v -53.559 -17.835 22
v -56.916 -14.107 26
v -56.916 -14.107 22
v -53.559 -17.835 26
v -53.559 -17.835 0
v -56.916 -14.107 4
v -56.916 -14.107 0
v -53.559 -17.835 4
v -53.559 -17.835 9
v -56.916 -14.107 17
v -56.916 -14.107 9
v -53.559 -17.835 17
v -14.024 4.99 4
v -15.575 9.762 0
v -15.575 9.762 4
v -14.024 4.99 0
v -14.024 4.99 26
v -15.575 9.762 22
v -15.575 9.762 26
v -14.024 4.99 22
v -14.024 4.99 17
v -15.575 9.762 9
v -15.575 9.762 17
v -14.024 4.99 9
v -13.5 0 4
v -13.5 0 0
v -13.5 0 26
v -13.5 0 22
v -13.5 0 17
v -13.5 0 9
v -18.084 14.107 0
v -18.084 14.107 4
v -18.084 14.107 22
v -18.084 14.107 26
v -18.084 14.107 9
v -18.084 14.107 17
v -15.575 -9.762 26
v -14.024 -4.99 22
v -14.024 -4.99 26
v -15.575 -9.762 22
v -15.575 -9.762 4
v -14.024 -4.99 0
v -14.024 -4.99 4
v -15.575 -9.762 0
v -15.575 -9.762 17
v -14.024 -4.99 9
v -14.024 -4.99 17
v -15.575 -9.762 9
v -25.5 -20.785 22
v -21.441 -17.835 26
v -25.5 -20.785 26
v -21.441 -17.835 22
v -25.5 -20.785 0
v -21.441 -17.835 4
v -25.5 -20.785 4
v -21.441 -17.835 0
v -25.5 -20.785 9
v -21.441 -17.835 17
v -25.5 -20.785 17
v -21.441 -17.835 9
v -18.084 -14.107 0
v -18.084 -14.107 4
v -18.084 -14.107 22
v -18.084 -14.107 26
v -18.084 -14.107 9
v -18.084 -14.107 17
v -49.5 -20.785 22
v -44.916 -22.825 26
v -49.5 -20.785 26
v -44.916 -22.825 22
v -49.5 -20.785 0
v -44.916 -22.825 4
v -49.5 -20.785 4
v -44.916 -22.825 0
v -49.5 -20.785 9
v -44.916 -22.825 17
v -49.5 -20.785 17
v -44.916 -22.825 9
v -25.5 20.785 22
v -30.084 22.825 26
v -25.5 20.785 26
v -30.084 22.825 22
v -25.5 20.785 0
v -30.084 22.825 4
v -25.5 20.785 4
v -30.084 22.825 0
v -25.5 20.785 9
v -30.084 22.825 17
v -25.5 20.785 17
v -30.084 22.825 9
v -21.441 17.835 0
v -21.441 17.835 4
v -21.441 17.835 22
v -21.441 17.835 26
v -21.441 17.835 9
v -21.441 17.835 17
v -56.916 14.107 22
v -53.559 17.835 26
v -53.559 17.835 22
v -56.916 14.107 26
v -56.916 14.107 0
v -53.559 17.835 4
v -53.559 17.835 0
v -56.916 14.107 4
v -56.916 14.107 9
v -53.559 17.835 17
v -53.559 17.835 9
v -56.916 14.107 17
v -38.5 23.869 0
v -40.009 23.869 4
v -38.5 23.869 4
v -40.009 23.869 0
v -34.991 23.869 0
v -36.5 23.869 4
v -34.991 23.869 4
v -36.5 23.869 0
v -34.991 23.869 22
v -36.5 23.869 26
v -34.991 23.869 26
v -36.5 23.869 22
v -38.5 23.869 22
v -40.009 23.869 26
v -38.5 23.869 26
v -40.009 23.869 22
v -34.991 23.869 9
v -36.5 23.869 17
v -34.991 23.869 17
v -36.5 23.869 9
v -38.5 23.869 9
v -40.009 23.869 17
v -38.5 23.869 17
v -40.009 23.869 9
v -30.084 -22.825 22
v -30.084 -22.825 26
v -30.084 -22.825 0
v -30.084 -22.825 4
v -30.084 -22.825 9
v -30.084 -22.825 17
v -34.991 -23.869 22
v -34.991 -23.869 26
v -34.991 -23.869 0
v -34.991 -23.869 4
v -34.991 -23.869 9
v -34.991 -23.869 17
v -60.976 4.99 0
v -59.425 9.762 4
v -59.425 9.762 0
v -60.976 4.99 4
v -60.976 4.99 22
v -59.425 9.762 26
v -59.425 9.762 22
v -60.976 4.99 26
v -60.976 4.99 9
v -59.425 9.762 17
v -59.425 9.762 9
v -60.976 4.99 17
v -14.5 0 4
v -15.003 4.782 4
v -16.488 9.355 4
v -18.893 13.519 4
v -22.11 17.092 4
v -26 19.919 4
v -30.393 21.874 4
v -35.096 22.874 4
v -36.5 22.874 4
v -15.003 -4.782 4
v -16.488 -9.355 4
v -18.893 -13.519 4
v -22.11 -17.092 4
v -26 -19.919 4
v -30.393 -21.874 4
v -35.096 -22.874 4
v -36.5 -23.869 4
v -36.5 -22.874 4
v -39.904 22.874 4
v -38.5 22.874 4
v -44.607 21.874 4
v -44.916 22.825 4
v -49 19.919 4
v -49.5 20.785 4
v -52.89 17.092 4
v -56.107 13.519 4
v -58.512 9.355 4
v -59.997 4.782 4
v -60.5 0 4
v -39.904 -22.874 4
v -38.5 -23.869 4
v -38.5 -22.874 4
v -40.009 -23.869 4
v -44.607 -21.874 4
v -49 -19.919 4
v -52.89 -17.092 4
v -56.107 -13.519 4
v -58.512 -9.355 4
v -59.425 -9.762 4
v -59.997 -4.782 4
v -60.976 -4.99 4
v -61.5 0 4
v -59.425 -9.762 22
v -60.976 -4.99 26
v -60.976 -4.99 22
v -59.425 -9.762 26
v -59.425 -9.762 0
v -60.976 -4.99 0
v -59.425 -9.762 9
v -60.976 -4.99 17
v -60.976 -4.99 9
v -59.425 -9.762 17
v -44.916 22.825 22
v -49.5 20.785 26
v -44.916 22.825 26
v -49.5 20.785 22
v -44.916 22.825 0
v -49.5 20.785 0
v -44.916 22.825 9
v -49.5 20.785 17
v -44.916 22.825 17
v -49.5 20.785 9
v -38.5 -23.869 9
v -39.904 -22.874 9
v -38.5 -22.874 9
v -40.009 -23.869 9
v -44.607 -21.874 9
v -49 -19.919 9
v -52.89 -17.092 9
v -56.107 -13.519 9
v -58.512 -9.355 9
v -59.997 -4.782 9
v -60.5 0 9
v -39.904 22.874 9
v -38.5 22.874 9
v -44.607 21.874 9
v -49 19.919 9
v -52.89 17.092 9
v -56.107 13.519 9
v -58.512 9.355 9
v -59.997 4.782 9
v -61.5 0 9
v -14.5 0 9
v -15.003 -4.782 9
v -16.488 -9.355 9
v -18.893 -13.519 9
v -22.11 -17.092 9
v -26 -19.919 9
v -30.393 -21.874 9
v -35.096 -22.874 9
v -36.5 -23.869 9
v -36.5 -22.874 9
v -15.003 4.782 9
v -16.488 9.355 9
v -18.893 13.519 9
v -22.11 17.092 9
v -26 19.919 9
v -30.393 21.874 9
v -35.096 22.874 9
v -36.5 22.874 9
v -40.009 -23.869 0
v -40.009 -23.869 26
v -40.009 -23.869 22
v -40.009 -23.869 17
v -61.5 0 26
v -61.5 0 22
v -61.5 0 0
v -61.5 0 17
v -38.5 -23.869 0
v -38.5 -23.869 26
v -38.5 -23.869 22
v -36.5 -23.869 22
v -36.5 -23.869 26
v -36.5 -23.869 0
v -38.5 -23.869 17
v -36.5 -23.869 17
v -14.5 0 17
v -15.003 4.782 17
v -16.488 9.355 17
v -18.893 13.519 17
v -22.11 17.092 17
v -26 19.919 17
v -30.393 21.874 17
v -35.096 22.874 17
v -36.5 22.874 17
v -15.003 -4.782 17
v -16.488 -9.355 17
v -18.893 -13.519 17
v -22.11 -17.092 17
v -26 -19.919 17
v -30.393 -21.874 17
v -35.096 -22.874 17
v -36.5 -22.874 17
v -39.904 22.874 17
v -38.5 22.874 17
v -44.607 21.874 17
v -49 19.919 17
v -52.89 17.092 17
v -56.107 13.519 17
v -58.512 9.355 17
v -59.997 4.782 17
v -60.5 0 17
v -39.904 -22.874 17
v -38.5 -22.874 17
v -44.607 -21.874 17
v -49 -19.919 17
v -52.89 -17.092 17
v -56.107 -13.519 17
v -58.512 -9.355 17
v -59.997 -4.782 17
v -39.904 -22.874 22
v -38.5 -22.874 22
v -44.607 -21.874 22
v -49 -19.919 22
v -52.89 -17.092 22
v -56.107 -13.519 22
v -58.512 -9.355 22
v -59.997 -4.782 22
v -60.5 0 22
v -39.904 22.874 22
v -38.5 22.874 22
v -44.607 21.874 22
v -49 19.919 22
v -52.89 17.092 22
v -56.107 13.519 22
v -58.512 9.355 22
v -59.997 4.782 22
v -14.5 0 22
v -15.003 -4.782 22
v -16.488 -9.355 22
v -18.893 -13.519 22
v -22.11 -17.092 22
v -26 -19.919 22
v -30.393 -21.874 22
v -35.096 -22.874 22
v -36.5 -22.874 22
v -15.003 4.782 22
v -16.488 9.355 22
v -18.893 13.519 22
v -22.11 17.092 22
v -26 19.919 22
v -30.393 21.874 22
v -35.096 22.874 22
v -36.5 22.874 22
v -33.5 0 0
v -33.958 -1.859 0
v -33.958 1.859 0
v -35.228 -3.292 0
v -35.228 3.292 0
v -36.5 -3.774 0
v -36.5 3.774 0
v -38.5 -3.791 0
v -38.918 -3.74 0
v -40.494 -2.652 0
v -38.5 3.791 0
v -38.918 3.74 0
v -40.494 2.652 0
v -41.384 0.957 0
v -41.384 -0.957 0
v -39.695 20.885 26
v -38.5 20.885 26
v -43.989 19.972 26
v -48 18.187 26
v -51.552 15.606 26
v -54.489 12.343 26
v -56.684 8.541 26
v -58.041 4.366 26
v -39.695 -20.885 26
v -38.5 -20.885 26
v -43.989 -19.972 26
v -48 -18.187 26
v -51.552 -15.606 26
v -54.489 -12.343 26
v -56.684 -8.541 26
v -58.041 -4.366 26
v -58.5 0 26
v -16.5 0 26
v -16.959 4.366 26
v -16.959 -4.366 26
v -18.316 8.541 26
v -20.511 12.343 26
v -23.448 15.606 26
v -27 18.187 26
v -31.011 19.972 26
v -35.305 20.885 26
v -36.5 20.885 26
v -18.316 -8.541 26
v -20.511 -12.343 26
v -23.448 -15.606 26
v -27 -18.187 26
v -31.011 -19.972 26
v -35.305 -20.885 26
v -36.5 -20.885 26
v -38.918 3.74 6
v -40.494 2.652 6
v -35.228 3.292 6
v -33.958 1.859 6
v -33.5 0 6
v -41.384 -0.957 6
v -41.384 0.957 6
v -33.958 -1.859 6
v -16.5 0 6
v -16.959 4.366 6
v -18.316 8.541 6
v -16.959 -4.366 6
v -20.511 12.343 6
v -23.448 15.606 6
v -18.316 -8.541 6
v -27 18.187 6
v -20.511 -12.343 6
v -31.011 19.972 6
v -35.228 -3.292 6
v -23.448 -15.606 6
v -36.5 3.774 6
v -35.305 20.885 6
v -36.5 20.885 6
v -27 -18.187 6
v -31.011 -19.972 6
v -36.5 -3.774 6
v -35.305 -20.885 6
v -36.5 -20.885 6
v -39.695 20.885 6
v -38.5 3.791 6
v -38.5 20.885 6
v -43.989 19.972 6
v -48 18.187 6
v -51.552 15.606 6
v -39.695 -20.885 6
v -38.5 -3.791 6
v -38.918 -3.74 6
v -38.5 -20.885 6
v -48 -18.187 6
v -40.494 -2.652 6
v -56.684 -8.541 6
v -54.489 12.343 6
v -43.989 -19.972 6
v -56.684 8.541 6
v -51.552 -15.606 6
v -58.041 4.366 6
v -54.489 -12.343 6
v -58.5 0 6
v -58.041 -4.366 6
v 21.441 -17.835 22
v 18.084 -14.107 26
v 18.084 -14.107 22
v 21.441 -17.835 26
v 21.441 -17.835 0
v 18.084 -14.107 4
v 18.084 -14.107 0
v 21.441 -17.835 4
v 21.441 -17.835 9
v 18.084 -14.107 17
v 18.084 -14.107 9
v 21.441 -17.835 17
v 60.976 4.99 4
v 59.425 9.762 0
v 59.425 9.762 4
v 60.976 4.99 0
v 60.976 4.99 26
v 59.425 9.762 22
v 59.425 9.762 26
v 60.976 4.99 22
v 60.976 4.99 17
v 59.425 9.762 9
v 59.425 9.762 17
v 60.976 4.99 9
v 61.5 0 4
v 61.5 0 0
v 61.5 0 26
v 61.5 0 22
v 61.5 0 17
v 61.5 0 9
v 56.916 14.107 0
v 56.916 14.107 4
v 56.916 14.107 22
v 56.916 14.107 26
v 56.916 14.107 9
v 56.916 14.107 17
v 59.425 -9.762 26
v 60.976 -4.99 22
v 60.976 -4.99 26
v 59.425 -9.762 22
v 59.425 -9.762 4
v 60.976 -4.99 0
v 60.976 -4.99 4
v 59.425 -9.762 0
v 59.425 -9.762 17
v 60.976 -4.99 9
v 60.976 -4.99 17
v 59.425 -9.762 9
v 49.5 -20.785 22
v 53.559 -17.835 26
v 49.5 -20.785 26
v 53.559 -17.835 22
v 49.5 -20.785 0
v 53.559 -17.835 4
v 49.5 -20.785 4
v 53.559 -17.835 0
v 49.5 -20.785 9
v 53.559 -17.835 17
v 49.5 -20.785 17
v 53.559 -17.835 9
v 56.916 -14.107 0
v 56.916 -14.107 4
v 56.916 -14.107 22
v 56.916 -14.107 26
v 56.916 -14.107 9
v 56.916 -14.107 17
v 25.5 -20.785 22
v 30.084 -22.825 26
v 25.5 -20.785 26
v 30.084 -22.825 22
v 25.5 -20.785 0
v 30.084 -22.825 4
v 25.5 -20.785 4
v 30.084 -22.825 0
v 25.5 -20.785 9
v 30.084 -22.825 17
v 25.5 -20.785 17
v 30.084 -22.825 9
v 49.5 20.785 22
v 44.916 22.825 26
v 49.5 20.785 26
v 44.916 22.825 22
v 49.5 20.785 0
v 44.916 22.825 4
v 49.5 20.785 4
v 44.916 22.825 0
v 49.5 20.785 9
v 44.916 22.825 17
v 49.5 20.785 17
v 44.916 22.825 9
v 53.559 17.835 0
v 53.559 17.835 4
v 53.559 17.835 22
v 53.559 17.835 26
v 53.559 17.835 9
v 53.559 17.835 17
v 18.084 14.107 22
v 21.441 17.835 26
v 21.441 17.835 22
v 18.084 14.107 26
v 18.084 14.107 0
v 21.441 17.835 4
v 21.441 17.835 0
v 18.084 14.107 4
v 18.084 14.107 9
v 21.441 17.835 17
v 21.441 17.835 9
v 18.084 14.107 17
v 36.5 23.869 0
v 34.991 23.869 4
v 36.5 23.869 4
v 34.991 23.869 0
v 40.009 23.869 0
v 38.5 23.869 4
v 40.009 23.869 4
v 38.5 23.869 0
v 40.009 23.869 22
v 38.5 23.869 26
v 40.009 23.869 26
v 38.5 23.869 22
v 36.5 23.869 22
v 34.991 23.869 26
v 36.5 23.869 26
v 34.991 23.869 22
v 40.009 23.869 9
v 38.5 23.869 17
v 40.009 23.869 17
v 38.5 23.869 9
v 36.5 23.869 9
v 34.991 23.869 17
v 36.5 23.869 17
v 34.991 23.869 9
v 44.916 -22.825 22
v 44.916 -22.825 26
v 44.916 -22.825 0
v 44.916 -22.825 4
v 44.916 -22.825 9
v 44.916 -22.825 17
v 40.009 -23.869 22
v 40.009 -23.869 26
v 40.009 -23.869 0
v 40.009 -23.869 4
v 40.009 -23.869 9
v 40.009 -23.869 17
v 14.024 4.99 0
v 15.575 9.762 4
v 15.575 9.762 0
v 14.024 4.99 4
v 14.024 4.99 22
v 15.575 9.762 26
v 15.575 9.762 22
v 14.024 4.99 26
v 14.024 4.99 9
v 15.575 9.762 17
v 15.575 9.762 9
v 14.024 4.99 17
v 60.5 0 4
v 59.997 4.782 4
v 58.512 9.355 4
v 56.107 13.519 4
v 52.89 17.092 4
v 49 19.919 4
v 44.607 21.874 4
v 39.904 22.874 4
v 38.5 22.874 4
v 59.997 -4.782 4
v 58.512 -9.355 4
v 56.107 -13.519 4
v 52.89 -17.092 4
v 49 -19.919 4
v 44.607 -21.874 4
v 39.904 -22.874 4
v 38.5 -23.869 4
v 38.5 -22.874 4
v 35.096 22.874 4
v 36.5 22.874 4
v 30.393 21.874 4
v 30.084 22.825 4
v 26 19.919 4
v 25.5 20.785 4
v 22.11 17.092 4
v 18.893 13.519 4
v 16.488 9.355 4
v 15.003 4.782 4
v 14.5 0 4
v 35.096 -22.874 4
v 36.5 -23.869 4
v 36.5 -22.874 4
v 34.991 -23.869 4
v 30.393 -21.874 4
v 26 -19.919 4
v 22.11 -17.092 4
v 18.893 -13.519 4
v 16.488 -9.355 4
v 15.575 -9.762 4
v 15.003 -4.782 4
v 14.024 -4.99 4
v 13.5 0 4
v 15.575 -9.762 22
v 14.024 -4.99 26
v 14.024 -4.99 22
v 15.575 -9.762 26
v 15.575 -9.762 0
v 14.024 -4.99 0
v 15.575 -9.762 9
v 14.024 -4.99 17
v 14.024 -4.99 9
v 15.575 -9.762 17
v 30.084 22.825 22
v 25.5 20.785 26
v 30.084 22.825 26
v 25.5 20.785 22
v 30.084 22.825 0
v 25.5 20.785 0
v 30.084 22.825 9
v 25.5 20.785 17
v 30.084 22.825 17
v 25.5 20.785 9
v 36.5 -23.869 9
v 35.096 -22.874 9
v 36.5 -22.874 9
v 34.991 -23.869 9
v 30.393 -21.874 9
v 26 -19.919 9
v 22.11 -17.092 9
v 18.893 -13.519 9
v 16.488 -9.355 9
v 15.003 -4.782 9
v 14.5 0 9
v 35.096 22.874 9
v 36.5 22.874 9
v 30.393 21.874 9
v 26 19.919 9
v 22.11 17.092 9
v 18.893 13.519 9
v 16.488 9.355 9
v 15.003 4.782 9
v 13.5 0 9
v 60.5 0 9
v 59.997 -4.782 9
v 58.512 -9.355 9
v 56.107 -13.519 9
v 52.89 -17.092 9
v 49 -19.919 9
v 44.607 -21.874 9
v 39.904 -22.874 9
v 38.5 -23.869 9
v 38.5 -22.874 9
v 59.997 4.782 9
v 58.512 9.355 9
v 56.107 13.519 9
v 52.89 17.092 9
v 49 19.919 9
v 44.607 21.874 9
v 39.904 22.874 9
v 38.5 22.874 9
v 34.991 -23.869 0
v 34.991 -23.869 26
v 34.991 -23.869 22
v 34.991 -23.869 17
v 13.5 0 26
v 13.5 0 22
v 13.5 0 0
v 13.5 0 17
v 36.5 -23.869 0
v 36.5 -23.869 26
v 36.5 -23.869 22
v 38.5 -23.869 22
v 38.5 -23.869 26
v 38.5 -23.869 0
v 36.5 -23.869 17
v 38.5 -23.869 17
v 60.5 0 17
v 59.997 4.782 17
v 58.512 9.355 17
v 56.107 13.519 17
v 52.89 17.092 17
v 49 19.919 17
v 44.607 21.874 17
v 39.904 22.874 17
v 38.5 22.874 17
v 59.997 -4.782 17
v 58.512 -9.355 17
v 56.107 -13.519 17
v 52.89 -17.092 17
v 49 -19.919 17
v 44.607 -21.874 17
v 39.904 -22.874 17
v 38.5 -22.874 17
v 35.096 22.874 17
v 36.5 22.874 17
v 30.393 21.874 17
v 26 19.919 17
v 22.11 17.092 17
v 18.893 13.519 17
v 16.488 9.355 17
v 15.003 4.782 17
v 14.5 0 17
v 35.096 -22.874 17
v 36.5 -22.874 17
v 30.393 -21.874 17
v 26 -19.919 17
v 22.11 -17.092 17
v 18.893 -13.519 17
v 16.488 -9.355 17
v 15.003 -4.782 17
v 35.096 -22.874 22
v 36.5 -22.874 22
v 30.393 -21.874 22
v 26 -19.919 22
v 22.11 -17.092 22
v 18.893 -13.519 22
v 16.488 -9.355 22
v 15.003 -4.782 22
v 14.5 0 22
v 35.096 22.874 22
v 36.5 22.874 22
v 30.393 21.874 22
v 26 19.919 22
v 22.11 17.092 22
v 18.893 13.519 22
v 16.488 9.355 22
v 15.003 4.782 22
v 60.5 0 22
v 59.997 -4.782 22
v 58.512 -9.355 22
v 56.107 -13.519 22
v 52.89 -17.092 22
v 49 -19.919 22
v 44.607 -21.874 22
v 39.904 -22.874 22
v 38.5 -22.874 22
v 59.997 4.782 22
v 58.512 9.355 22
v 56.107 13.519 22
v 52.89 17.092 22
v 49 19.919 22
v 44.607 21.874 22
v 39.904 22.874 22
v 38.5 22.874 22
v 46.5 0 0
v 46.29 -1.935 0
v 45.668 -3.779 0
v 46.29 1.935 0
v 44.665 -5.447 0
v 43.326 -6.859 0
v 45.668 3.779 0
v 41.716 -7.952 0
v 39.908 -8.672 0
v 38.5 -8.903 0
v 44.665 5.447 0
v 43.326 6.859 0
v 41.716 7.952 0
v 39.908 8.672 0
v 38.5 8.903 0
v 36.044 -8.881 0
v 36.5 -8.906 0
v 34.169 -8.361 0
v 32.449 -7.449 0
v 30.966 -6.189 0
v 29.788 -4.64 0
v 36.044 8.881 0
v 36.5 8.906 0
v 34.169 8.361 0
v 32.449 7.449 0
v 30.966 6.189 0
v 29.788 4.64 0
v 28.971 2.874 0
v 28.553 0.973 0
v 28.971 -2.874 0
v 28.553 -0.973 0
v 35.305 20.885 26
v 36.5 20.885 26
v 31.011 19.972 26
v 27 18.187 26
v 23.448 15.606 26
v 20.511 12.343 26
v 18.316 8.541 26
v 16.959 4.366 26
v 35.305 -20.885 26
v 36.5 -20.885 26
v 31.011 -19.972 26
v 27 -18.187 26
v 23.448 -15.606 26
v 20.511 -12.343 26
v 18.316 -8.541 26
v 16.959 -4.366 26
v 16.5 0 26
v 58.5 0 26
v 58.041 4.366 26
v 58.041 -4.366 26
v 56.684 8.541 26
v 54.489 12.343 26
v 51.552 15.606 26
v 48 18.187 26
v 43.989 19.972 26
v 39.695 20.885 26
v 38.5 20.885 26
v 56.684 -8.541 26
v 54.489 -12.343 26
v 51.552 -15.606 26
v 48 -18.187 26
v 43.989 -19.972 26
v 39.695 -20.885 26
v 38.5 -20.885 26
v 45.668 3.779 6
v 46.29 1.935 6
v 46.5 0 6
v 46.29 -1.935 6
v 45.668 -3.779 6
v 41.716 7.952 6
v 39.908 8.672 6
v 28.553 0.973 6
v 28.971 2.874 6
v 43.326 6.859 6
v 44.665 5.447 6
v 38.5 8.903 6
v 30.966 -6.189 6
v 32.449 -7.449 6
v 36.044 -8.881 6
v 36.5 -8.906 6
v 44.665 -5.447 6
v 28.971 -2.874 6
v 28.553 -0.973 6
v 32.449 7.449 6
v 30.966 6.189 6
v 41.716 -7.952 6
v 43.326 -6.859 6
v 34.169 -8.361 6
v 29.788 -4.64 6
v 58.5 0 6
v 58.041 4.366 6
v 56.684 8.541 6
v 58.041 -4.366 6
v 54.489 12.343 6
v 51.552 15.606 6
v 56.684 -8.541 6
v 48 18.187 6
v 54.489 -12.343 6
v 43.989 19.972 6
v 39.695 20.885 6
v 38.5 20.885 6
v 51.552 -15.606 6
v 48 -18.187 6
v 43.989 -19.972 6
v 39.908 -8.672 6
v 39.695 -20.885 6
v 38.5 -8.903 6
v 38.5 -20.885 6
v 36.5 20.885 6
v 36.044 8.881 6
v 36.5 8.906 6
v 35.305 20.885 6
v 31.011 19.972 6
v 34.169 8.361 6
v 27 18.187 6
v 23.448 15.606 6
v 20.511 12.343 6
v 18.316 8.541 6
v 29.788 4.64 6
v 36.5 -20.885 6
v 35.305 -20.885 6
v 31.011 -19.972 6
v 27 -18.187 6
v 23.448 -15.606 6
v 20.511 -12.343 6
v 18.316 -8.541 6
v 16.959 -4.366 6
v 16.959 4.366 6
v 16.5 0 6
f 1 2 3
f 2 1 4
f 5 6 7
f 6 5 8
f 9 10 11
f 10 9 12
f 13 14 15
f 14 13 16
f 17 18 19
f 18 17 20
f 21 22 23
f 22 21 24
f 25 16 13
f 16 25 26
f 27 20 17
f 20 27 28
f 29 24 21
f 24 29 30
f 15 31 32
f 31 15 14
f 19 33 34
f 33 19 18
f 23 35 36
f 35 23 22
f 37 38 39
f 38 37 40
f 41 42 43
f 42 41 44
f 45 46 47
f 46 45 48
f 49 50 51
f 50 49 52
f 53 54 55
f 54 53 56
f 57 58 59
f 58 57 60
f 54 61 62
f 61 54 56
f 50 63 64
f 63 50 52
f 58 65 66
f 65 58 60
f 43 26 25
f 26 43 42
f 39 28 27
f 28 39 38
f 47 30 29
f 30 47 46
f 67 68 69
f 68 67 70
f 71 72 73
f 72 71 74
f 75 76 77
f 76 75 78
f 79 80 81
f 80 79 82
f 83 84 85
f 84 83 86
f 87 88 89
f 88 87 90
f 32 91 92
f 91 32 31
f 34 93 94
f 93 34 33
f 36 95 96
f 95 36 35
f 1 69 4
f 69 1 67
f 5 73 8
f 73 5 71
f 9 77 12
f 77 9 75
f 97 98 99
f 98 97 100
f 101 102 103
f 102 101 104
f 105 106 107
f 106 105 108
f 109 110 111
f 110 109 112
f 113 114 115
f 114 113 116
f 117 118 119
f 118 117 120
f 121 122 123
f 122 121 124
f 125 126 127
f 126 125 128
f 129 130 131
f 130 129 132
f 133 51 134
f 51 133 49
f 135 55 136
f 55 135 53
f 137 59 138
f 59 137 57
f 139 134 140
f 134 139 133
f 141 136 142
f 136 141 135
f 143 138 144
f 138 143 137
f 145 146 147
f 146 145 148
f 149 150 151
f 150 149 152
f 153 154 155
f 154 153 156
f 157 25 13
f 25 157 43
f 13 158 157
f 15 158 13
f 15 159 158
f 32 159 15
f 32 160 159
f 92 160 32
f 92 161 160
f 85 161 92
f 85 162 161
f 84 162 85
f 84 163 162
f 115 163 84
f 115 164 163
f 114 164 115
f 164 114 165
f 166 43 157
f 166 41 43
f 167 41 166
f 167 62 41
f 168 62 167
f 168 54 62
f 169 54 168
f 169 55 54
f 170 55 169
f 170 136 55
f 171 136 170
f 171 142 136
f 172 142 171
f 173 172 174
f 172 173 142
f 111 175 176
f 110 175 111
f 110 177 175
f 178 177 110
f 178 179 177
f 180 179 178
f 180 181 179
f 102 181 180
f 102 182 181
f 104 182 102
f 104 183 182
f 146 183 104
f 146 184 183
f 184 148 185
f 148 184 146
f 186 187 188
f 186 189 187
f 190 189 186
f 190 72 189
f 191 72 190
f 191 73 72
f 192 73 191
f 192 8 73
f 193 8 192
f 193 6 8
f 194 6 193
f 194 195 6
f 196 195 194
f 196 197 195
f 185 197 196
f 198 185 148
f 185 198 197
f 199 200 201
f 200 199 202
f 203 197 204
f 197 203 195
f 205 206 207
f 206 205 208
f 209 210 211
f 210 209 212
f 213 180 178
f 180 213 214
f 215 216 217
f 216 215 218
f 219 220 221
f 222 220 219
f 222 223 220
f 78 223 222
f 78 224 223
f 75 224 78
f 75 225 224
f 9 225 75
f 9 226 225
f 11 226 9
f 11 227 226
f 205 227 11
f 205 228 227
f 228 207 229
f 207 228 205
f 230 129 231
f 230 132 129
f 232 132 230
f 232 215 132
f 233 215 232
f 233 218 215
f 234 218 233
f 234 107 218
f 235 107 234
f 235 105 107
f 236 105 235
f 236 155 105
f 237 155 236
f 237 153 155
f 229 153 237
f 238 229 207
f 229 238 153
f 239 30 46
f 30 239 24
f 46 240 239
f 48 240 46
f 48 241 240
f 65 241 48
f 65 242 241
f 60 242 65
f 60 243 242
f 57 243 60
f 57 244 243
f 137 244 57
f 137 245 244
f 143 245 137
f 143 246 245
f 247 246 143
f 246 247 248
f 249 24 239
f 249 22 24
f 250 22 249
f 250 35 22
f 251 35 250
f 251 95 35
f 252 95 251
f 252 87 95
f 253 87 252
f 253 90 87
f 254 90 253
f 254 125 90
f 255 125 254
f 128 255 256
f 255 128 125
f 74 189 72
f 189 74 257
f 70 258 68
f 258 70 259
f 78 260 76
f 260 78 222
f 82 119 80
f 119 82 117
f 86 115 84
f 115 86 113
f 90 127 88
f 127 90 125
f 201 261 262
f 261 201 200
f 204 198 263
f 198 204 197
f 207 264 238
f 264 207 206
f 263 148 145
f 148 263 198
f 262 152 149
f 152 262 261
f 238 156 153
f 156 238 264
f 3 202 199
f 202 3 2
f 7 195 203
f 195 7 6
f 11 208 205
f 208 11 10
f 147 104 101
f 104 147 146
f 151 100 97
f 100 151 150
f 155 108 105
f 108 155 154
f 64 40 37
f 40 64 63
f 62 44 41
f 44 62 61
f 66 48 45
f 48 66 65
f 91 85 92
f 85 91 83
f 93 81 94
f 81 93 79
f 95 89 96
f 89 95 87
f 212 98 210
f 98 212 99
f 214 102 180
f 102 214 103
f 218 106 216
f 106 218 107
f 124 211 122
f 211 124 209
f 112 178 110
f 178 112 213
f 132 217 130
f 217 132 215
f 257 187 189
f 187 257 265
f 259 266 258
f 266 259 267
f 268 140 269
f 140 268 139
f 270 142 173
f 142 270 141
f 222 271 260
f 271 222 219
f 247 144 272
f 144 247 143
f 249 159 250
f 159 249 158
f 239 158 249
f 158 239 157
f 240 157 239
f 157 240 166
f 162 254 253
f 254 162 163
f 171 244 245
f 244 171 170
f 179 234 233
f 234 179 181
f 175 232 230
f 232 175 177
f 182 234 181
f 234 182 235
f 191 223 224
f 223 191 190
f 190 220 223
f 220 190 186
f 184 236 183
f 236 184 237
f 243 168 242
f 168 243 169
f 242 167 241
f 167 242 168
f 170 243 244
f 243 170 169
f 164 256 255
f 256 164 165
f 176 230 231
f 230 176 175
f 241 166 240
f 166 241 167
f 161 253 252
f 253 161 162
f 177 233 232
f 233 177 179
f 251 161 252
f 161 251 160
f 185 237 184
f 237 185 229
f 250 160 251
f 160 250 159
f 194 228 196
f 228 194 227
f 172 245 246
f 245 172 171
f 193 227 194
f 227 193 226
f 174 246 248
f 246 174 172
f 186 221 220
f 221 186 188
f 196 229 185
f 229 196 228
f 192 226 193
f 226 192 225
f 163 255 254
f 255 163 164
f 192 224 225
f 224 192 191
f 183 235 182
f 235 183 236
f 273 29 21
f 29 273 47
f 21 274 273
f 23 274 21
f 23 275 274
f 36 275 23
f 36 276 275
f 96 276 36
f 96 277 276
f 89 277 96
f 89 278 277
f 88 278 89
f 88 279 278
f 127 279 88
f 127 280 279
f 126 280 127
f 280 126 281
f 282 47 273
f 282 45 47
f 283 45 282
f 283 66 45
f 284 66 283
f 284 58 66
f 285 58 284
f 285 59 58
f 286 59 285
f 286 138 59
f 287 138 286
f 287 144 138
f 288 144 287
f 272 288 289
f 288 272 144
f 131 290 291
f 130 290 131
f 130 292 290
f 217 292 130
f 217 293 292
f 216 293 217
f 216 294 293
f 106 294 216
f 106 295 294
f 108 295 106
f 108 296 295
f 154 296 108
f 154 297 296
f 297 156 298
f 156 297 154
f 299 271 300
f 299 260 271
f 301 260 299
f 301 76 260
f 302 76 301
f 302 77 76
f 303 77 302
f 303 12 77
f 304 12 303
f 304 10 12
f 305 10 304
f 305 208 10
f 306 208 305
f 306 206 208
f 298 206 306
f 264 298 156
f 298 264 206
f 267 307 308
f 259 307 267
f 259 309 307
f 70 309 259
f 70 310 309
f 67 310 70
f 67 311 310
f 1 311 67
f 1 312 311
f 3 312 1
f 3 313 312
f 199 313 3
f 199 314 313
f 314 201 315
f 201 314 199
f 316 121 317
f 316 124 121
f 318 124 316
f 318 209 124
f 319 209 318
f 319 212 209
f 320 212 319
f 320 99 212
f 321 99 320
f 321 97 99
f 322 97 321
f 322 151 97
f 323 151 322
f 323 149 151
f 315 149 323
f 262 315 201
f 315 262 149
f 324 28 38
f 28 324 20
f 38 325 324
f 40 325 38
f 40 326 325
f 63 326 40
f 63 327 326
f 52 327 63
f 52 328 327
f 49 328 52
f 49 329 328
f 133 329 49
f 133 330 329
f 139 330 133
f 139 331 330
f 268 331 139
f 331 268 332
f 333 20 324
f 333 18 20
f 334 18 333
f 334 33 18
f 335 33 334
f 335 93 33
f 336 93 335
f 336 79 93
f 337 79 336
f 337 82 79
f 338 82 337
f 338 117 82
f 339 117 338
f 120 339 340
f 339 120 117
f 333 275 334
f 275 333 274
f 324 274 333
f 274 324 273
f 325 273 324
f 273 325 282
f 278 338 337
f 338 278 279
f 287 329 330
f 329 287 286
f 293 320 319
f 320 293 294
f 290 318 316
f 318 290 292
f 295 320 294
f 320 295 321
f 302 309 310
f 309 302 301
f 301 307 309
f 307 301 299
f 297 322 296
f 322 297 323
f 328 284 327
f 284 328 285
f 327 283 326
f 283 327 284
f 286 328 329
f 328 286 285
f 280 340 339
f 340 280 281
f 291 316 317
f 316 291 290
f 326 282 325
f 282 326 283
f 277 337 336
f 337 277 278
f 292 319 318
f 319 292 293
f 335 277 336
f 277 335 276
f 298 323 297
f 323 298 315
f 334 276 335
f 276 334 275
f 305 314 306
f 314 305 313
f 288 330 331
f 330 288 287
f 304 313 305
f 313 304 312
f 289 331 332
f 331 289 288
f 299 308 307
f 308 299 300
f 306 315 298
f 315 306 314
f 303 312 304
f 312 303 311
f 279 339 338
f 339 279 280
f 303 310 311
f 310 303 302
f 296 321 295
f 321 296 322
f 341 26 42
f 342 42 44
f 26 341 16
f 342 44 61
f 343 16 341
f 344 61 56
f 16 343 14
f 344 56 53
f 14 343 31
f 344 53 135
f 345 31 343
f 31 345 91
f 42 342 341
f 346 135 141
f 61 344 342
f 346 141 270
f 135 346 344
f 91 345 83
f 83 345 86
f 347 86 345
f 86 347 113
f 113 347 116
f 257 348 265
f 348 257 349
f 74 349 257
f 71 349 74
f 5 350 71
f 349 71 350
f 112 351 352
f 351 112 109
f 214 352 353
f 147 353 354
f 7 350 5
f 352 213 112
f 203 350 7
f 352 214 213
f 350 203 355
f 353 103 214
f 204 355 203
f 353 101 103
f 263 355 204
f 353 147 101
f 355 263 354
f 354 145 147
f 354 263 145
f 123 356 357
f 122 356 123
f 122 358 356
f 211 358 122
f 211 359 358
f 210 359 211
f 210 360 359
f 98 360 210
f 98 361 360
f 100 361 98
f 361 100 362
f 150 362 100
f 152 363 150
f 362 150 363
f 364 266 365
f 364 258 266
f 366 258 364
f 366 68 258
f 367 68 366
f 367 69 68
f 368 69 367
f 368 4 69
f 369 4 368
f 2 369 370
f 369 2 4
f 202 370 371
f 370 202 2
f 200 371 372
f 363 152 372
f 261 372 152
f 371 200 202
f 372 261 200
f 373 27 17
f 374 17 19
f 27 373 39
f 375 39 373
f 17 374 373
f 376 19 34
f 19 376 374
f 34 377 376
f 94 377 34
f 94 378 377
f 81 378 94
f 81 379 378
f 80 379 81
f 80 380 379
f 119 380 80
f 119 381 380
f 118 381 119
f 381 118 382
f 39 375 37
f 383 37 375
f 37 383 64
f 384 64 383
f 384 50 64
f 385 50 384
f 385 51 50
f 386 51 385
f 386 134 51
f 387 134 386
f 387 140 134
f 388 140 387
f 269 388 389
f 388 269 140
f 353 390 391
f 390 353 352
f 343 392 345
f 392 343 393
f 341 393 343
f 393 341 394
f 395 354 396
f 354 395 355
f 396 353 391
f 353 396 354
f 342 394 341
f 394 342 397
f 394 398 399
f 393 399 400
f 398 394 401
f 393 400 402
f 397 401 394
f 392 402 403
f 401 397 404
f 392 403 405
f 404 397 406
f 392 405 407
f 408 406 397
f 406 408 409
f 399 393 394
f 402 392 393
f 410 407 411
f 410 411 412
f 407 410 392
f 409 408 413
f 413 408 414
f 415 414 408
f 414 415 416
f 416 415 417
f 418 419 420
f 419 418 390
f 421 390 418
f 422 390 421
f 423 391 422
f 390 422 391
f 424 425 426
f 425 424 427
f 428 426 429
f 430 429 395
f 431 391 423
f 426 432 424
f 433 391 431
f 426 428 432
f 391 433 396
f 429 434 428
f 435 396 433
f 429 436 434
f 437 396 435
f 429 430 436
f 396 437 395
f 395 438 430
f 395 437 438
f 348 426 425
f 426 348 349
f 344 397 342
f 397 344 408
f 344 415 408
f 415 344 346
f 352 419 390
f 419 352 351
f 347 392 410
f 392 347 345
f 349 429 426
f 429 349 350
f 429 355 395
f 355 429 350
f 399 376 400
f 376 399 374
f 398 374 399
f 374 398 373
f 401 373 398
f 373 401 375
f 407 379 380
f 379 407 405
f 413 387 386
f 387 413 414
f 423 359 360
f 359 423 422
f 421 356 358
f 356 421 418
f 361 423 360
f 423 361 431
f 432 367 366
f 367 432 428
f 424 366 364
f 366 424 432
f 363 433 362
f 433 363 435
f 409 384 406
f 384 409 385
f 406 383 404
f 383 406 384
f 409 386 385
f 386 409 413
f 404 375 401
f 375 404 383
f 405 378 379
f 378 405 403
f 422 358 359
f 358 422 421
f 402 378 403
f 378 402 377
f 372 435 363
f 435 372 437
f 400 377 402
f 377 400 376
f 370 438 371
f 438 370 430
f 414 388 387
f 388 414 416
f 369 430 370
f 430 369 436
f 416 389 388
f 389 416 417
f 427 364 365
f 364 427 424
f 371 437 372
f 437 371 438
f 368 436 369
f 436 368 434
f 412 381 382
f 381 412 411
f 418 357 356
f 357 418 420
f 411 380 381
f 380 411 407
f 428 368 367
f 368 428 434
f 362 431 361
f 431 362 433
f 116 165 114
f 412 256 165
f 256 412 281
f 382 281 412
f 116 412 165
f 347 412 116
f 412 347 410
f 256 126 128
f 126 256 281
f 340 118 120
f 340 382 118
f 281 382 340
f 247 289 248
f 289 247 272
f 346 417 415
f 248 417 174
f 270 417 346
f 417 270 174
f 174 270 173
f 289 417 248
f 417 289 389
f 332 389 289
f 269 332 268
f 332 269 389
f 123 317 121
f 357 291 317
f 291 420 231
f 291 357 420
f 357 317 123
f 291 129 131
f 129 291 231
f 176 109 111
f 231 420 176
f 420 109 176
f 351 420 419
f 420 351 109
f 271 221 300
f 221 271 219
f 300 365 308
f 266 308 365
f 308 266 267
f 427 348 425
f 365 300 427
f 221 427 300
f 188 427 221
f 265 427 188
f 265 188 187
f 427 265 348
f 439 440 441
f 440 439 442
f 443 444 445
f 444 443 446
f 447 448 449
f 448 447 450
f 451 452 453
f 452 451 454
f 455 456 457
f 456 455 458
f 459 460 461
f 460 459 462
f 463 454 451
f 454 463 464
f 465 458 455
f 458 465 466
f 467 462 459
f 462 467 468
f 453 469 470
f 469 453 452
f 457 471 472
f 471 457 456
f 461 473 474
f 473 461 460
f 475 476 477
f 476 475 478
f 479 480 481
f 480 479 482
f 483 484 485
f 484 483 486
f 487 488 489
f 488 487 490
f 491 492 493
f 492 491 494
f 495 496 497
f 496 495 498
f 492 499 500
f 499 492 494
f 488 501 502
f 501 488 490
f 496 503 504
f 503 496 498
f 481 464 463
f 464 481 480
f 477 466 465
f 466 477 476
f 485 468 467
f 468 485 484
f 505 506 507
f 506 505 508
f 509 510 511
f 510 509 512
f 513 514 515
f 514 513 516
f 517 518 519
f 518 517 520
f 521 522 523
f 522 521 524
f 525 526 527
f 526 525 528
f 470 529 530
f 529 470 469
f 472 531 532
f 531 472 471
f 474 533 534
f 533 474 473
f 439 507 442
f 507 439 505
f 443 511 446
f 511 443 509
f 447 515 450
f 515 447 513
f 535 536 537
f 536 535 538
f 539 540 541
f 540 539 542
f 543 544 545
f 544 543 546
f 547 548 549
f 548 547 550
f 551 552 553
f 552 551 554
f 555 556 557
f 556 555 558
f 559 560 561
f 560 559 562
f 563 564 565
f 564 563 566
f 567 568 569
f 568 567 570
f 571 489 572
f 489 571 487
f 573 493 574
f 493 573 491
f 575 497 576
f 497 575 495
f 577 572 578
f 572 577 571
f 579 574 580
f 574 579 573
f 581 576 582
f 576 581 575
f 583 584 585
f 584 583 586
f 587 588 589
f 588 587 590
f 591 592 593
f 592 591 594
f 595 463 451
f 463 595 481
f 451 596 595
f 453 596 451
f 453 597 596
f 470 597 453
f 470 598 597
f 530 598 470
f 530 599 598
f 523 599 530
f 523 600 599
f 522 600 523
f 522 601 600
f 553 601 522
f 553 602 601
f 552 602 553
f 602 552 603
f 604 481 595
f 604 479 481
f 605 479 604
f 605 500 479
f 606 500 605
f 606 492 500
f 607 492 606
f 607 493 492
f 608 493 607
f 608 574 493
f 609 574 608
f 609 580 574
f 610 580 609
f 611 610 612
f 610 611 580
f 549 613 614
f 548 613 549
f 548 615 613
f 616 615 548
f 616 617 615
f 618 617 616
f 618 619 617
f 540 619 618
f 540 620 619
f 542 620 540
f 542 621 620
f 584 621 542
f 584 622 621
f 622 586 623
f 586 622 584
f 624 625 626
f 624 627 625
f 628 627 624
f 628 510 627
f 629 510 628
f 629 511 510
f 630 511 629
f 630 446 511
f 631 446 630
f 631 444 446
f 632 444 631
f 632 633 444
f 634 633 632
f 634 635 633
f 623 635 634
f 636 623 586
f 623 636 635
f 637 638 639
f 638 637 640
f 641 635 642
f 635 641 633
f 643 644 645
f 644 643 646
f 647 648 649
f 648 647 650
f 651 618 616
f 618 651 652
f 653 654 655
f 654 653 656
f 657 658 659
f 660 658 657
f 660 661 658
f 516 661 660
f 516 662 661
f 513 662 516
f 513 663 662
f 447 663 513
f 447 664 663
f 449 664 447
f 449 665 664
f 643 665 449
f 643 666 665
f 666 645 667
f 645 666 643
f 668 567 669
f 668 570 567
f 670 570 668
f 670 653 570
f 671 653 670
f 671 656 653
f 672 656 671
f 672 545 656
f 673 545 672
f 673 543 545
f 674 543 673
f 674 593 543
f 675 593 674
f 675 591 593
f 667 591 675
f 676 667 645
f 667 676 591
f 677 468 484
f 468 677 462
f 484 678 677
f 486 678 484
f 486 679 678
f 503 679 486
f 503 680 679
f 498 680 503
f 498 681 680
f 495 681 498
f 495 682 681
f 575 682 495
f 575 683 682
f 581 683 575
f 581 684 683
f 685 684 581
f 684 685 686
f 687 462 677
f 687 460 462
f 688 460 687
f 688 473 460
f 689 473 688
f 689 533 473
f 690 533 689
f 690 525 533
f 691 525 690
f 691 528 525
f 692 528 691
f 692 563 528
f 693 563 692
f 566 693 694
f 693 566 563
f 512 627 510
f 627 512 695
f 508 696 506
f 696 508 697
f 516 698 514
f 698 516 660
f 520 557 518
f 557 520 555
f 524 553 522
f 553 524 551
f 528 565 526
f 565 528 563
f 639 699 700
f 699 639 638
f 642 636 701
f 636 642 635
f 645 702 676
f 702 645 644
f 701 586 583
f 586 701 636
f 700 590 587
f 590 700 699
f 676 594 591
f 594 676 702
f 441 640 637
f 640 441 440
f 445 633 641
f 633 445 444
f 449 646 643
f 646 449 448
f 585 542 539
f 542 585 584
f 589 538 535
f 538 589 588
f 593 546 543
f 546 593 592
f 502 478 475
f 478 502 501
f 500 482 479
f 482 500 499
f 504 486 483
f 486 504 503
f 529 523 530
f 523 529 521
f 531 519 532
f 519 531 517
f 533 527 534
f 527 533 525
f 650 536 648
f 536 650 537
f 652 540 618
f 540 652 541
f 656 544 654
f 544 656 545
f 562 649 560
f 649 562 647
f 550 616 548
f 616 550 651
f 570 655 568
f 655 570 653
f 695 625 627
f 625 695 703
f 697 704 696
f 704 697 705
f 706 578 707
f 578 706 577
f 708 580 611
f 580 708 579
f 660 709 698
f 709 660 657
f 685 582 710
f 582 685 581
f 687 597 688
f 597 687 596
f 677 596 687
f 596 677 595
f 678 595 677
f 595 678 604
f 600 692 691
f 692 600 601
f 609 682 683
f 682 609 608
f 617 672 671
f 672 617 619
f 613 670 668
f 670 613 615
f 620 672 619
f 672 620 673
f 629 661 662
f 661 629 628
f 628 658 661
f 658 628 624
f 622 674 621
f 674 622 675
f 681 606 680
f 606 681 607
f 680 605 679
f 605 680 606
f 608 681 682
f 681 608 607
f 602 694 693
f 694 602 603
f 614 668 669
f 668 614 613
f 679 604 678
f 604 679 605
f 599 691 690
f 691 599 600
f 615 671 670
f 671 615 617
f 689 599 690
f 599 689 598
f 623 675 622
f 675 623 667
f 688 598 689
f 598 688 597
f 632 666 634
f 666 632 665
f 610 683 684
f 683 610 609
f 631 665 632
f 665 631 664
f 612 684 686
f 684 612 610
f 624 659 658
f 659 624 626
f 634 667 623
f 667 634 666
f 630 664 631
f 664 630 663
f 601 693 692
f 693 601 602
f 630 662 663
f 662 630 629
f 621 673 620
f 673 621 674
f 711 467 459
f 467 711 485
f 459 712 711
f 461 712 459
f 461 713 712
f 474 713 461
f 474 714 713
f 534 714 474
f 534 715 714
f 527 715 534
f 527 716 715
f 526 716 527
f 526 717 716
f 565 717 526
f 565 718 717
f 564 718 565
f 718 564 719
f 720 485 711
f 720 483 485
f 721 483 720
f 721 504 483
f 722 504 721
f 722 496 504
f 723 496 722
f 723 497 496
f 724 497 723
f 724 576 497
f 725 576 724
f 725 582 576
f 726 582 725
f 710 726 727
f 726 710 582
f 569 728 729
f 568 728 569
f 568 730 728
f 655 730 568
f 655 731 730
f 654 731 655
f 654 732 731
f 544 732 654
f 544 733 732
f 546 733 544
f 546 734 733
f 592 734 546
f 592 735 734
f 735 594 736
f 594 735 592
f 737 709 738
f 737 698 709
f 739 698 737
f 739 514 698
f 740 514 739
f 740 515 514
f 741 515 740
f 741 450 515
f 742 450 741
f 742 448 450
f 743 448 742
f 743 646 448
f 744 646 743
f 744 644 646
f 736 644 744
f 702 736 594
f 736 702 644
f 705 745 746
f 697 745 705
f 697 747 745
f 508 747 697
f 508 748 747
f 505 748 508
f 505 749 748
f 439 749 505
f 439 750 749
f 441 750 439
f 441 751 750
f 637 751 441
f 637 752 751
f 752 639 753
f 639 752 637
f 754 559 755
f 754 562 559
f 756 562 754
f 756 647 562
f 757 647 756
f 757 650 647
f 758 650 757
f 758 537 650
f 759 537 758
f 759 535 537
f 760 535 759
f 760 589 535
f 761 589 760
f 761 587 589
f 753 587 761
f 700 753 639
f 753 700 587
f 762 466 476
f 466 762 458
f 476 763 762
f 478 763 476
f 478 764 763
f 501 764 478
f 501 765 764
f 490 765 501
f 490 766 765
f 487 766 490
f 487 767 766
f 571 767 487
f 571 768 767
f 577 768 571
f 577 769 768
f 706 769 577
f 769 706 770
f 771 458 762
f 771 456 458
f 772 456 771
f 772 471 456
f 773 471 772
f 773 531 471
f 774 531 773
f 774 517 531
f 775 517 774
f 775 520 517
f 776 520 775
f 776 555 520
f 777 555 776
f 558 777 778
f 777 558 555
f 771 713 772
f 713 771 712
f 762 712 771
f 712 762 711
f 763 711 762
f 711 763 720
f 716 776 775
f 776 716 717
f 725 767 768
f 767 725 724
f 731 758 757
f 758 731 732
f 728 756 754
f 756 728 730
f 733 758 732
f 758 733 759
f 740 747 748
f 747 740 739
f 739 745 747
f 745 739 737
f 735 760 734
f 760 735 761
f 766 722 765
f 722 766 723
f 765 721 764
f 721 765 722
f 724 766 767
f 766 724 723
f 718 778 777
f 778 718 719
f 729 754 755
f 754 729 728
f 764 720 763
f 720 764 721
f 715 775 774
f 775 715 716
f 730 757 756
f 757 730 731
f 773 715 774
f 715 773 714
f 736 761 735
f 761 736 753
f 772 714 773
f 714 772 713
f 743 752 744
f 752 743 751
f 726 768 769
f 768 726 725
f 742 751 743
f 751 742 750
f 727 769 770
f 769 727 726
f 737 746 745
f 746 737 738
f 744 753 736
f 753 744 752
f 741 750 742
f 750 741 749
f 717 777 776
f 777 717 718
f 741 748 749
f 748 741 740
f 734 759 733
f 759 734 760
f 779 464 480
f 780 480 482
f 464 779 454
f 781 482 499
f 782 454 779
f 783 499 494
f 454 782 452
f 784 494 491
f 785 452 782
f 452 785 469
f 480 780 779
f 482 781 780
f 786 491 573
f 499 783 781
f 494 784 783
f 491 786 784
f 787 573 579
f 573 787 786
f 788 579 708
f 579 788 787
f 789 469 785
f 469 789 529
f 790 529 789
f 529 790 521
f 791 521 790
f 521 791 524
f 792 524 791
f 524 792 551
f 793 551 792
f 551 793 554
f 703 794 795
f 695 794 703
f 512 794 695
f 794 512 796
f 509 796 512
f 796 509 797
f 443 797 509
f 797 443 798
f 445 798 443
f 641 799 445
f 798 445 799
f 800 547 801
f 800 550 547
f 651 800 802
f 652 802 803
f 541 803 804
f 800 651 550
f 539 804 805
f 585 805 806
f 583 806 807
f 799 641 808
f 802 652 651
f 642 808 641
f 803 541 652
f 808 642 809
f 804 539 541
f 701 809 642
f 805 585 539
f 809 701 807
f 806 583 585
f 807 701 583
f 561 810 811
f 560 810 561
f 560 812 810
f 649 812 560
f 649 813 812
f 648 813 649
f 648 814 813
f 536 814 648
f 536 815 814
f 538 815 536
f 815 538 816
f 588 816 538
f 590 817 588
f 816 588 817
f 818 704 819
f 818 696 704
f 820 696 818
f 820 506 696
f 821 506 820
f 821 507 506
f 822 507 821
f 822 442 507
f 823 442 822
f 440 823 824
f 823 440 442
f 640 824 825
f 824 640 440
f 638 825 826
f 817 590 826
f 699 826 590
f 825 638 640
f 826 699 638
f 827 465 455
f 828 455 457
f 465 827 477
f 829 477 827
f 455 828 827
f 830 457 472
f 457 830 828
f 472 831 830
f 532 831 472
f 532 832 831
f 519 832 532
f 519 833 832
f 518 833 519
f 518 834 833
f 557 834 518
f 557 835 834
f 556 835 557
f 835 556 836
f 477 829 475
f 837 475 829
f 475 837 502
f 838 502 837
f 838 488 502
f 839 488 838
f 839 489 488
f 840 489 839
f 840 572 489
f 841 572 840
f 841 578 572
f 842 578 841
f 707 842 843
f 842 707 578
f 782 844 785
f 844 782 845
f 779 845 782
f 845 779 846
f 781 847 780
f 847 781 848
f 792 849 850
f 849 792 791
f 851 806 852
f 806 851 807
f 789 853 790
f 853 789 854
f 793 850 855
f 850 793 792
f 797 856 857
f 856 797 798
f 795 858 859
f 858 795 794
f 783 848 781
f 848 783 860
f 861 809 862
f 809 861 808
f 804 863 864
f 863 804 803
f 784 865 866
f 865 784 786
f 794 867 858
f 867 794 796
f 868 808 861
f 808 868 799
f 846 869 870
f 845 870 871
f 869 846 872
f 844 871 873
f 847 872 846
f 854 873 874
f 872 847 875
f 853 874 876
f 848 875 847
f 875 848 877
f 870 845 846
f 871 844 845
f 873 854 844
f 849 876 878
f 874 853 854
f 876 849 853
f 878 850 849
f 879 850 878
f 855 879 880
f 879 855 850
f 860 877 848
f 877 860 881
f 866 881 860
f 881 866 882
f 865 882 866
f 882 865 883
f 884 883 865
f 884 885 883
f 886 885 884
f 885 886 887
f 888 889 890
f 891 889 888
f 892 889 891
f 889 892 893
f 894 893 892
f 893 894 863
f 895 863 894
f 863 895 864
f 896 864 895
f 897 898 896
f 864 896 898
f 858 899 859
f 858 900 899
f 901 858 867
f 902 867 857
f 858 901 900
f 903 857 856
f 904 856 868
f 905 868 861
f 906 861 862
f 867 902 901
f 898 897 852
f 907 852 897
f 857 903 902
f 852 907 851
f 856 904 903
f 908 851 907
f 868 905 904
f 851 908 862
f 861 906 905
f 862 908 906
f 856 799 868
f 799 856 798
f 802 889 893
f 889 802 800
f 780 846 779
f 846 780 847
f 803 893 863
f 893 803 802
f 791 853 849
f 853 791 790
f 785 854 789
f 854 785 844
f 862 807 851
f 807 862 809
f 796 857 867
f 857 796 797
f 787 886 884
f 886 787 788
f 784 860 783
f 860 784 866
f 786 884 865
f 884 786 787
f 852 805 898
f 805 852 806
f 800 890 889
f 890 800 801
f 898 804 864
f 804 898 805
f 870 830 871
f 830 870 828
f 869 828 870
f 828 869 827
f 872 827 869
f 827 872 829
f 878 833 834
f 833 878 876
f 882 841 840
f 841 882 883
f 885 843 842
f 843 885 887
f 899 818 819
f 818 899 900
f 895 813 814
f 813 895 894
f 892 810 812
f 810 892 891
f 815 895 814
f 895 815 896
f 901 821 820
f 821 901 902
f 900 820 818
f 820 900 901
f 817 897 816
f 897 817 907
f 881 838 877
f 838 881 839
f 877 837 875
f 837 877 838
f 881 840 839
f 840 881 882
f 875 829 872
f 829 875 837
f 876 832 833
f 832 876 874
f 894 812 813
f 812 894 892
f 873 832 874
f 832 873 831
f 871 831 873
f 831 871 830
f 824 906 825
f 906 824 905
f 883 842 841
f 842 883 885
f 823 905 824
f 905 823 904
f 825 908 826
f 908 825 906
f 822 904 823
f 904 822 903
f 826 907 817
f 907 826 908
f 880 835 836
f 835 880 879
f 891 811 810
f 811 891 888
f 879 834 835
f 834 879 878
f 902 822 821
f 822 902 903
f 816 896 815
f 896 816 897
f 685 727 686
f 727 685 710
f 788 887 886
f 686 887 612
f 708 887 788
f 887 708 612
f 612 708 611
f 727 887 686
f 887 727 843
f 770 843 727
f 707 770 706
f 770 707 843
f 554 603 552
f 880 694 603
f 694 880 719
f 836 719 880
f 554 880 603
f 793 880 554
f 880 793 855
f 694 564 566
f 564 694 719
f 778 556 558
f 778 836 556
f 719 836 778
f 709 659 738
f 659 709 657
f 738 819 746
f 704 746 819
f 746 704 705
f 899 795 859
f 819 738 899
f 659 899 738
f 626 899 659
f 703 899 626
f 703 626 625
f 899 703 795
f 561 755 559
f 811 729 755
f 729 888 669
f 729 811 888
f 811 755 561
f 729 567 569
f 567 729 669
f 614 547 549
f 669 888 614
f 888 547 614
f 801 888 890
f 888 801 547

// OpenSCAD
l_small1 = 6;
l_small2 = 6;
l_big1 = 20;
l_big2 = 20;
r_small1 = 8/2;
r_small2 = 18/2;
r_big1 = 42/2;
r_big2 = 42/2;

wall_thickness = 3;
ziptie_width = 5;

module stressrelief(l_big,l_small,r_big,r_small) 
{
	difference()
	{
		cylinder(h=l_big+l_small, r=r_big+wall_thickness);
		cylinder(h=l_small, r=r_small);
		translate([0,0,l_small]) cylinder(h=l_big, r=r_big);
		translate([-1,-50,0]) cube([2,100,100]);
		translate([0,0,(l_big+l_small)/4-ziptie_width/2]) difference() 
		{
			cylinder(h=ziptie_width, r=r_big+wall_thickness);
			cylinder(h=ziptie_width, r=r_big+wall_thickness-1);
		}
		translate([0,0,l_big+l_small-(l_big+l_small)/4-ziptie_width/2]) difference() 
		{
			cylinder(h=ziptie_width, r=r_big+wall_thickness);
			cylinder(h=ziptie_width, r=r_big+wall_thickness-1);
		}
	}
}

translate([-75/2,0,0]) stressrelief(l_big1,l_small1,r_big1,r_small1);
translate([75/2,0,0]) stressrelief(l_big2,l_small2,r_big2,r_small2);
